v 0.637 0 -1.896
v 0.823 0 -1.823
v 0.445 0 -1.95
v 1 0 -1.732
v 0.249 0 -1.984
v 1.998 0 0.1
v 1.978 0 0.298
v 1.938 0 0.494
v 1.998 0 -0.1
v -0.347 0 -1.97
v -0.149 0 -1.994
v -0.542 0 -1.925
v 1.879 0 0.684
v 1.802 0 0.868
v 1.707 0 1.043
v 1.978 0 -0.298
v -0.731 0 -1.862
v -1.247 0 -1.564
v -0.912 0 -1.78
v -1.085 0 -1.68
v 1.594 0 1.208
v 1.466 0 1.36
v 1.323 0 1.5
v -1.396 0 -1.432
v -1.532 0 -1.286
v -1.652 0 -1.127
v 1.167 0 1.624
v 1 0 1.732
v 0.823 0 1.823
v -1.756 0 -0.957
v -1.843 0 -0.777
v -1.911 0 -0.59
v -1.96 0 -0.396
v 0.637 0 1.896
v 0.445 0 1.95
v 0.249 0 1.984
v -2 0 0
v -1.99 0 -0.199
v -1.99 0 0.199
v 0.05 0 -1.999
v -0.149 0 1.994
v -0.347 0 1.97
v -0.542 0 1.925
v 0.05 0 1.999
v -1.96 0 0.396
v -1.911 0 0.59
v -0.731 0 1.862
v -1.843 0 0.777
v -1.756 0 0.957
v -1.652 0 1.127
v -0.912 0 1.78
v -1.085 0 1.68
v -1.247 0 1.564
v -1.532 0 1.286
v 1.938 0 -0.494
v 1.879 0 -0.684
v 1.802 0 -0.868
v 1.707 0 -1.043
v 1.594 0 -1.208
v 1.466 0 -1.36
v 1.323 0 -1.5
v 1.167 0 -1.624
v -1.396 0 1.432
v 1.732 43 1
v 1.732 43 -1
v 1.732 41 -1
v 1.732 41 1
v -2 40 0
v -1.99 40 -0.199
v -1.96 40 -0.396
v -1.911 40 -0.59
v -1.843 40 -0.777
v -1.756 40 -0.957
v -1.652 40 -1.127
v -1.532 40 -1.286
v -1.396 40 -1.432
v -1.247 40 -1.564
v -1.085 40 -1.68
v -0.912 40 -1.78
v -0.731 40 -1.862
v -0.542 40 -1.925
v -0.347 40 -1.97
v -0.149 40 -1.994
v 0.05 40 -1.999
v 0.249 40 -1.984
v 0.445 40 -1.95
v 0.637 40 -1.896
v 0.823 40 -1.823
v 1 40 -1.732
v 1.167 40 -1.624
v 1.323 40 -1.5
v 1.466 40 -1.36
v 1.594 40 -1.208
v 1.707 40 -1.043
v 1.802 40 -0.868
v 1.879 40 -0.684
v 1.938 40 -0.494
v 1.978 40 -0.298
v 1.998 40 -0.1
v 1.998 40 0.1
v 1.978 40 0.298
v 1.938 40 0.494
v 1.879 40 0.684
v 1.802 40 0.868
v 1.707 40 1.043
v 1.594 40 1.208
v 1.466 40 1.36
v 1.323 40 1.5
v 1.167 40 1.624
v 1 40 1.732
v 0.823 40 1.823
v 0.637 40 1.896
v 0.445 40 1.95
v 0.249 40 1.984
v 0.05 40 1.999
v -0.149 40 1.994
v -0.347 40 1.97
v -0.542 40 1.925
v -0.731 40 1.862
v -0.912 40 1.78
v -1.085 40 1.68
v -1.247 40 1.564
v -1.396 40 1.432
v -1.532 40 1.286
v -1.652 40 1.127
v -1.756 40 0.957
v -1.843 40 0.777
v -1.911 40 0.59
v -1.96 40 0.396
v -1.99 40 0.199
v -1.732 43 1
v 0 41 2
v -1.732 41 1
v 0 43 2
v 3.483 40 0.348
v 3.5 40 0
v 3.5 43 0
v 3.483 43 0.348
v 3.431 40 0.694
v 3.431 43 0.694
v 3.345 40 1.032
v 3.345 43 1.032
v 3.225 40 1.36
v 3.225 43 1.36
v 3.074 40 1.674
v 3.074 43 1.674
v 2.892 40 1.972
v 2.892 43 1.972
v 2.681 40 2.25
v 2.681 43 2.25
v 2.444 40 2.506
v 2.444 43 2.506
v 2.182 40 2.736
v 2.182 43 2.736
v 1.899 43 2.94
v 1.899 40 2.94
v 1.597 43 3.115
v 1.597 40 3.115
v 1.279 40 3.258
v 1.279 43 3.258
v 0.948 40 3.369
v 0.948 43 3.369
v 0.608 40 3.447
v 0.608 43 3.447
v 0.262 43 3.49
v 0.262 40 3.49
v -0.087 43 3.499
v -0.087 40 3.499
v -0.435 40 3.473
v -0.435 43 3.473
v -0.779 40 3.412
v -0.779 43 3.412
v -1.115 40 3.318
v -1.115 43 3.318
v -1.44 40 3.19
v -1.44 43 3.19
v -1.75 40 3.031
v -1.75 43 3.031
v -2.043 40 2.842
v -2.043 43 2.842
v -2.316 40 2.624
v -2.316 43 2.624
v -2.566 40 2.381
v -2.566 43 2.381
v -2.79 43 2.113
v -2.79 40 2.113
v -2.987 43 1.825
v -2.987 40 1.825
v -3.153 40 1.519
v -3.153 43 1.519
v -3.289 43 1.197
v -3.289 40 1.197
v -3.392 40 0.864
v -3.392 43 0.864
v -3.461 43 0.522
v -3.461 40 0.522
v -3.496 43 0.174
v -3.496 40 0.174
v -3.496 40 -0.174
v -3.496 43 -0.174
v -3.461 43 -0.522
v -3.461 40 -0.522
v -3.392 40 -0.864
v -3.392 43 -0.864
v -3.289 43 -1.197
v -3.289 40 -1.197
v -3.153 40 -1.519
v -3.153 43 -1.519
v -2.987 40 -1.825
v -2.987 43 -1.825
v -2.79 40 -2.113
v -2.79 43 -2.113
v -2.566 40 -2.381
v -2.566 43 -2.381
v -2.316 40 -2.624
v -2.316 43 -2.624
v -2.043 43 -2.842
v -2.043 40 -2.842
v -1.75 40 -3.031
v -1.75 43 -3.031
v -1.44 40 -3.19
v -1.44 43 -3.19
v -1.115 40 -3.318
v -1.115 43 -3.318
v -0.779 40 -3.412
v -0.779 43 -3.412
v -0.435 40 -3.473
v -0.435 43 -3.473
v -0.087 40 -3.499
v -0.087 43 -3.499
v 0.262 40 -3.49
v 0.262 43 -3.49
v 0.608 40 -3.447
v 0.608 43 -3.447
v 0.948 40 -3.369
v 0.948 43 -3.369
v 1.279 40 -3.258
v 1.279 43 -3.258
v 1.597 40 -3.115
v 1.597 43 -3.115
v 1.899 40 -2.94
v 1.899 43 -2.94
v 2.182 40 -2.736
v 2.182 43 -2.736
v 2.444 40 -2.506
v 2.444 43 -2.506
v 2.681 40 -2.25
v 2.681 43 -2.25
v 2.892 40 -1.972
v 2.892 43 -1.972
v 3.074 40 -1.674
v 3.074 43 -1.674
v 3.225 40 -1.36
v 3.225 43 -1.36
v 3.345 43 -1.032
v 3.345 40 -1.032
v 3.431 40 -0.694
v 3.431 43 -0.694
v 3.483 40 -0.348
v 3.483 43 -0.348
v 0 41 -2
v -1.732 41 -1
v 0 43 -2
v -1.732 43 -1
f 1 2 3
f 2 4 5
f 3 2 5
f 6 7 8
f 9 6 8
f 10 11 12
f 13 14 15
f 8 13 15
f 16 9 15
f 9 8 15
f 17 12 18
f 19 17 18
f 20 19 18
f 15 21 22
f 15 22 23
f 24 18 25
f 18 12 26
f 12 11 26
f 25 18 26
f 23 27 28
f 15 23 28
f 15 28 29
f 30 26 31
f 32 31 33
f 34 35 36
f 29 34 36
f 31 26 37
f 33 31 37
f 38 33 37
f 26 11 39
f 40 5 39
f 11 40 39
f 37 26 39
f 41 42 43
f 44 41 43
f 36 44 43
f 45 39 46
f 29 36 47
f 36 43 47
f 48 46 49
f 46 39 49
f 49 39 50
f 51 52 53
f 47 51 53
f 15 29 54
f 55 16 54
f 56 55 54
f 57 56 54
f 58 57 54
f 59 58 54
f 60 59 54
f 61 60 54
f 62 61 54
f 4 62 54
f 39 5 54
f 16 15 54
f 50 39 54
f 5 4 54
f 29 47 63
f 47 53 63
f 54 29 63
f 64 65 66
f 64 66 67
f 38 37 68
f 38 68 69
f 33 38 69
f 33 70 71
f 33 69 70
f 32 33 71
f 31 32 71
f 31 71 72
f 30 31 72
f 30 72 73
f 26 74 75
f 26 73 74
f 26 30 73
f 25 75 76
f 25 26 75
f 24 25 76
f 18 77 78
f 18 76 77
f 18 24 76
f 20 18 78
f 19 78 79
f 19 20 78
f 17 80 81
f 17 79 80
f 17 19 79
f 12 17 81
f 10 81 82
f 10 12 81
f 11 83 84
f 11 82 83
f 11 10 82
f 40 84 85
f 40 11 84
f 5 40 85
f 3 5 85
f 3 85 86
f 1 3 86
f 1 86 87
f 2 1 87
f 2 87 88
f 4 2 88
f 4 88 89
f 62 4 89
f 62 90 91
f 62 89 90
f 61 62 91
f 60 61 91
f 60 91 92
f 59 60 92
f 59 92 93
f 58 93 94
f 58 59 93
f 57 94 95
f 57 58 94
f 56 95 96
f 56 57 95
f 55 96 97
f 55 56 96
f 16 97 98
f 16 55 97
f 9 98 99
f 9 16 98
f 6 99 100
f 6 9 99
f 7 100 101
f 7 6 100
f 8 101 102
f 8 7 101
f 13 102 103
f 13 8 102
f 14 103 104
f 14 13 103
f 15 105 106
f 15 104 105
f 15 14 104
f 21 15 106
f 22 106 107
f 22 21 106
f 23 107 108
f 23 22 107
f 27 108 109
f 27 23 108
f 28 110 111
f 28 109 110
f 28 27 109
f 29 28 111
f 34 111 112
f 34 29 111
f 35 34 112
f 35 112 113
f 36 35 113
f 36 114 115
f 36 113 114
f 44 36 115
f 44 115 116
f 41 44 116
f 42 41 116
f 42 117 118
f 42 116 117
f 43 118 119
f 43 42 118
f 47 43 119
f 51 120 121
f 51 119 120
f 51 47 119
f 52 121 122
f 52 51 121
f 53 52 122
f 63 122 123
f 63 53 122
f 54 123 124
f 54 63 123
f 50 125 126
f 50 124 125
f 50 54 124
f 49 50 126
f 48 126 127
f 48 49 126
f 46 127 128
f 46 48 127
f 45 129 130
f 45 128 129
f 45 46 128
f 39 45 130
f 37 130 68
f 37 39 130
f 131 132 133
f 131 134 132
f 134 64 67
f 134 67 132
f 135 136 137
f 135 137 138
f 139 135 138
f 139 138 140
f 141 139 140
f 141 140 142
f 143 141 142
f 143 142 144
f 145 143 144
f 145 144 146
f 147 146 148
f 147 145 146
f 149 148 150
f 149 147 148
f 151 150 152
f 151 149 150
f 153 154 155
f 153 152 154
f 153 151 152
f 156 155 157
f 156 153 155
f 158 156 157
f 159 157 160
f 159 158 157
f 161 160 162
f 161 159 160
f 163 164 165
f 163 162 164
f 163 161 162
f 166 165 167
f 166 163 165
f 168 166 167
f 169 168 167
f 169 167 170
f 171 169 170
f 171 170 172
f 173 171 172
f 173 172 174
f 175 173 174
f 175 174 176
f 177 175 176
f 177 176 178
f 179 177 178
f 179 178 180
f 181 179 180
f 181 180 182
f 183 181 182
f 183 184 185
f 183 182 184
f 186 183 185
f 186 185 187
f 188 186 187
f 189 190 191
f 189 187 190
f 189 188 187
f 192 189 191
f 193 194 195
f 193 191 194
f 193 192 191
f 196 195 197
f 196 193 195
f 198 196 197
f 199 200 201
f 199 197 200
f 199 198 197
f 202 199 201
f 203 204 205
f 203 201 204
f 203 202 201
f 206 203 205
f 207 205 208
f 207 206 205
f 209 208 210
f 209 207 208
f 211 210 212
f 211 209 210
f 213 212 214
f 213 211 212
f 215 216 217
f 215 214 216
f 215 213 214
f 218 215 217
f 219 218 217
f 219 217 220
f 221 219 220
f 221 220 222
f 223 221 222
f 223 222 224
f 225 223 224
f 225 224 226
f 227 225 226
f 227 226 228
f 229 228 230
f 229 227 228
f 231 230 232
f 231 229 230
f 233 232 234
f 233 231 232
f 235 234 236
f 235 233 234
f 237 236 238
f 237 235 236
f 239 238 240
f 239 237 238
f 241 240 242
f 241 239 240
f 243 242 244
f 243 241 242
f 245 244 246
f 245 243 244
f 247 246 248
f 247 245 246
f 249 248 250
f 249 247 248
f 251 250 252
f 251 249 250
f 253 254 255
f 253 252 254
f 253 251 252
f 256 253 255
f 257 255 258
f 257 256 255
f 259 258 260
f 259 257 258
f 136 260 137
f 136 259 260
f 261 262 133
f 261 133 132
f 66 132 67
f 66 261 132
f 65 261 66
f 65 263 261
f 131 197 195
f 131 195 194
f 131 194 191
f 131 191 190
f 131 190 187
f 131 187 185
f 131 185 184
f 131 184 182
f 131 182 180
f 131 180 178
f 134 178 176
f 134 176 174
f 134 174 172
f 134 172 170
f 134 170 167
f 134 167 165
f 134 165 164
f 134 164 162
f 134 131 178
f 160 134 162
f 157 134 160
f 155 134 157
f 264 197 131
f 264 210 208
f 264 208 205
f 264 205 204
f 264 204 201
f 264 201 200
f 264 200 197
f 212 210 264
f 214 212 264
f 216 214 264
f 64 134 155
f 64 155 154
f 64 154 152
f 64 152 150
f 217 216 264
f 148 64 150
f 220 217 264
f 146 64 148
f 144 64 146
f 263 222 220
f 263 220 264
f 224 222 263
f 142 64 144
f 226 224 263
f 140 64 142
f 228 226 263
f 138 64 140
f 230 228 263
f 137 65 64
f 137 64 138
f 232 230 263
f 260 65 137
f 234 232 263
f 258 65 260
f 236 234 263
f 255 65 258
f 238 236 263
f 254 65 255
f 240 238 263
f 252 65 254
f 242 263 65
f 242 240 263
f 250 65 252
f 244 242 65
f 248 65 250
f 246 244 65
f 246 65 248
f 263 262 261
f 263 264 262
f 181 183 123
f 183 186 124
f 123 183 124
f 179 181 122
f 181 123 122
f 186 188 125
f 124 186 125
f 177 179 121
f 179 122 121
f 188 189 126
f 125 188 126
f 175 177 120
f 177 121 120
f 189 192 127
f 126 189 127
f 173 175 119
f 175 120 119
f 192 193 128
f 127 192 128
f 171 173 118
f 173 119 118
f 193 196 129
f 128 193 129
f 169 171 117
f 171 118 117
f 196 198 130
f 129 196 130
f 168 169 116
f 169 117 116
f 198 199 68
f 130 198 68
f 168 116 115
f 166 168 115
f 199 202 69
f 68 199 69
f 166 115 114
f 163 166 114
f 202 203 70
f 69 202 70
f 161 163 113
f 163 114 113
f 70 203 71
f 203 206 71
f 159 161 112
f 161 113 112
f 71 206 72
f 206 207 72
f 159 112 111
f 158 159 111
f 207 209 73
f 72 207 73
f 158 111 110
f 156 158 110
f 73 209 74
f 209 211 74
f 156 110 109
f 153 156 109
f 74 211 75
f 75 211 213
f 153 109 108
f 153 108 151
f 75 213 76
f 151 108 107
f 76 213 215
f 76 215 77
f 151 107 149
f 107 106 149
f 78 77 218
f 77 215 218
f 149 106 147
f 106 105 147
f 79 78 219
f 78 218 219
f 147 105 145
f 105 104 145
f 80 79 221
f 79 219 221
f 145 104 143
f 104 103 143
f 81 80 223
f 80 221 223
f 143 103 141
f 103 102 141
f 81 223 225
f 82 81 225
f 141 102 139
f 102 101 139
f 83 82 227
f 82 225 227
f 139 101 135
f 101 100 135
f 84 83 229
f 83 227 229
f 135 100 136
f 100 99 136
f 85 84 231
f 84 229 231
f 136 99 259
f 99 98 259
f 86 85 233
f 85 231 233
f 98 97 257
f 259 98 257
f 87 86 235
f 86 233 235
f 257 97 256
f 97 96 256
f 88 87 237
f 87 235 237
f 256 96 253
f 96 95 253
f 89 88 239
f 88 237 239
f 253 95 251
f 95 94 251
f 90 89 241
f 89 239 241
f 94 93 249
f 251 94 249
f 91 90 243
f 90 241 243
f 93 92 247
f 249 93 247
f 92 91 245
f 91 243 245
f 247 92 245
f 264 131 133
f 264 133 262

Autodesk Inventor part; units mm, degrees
ref_plane "YZ Plane" through (0, 0, 0) normal (1, 0, 0) x (0, 1, 0)
ref_plane "XZ Plane" through (0, 0, 0) normal (0, 1, 0) x (-1, 0, 0)
ref_plane "XY Plane" through (0, 0, 0) normal (0, 0, 1) x (1, 0, 0)
sketch "Sketch1" plane through (0, 0, 0) normal (0, 1, 0) x (-1, 0, 0)
  circle A0 centre (0, 0) radius 2
  dimension "d0" = 4
extrude "Extrusion1" add sketch "Sketch1" along normal blind 40
sketch "Sketch2" plane through (0, 40, 0) normal (0, 1, 0) x (1, 0, 0)
  circle A0 centre (0, 0) radius 3.5
  dimension "d3" = 7
extrude "Extrusion2" add sketch "Sketch2" along normal blind 3
sketch "Sketch3" plane through (0, 43, 0) normal (0, 1, 0) x (1, 0, 0)
  circle A0 centre (0, 0) radius 2 projected
  line L0 (0, 2) -> (1.7321, 1)
  line L1 (1.7321, 1) -> (1.7321, -1)
  line L2 (1.7321, -1) -> (0, -2)
  line L3 (0, -2) -> (-1.7321, -1)
  line L4 (-1.7321, -1) -> (-1.7321, 1)
  line L5 (-1.7321, 1) -> (0, 2)
extrude "Extrusion3" cut sketch "Sketch3" against normal blind 2 contours L1 L2 L3 L4 L5 L0
properties part number "M4_hinge_bolt"
